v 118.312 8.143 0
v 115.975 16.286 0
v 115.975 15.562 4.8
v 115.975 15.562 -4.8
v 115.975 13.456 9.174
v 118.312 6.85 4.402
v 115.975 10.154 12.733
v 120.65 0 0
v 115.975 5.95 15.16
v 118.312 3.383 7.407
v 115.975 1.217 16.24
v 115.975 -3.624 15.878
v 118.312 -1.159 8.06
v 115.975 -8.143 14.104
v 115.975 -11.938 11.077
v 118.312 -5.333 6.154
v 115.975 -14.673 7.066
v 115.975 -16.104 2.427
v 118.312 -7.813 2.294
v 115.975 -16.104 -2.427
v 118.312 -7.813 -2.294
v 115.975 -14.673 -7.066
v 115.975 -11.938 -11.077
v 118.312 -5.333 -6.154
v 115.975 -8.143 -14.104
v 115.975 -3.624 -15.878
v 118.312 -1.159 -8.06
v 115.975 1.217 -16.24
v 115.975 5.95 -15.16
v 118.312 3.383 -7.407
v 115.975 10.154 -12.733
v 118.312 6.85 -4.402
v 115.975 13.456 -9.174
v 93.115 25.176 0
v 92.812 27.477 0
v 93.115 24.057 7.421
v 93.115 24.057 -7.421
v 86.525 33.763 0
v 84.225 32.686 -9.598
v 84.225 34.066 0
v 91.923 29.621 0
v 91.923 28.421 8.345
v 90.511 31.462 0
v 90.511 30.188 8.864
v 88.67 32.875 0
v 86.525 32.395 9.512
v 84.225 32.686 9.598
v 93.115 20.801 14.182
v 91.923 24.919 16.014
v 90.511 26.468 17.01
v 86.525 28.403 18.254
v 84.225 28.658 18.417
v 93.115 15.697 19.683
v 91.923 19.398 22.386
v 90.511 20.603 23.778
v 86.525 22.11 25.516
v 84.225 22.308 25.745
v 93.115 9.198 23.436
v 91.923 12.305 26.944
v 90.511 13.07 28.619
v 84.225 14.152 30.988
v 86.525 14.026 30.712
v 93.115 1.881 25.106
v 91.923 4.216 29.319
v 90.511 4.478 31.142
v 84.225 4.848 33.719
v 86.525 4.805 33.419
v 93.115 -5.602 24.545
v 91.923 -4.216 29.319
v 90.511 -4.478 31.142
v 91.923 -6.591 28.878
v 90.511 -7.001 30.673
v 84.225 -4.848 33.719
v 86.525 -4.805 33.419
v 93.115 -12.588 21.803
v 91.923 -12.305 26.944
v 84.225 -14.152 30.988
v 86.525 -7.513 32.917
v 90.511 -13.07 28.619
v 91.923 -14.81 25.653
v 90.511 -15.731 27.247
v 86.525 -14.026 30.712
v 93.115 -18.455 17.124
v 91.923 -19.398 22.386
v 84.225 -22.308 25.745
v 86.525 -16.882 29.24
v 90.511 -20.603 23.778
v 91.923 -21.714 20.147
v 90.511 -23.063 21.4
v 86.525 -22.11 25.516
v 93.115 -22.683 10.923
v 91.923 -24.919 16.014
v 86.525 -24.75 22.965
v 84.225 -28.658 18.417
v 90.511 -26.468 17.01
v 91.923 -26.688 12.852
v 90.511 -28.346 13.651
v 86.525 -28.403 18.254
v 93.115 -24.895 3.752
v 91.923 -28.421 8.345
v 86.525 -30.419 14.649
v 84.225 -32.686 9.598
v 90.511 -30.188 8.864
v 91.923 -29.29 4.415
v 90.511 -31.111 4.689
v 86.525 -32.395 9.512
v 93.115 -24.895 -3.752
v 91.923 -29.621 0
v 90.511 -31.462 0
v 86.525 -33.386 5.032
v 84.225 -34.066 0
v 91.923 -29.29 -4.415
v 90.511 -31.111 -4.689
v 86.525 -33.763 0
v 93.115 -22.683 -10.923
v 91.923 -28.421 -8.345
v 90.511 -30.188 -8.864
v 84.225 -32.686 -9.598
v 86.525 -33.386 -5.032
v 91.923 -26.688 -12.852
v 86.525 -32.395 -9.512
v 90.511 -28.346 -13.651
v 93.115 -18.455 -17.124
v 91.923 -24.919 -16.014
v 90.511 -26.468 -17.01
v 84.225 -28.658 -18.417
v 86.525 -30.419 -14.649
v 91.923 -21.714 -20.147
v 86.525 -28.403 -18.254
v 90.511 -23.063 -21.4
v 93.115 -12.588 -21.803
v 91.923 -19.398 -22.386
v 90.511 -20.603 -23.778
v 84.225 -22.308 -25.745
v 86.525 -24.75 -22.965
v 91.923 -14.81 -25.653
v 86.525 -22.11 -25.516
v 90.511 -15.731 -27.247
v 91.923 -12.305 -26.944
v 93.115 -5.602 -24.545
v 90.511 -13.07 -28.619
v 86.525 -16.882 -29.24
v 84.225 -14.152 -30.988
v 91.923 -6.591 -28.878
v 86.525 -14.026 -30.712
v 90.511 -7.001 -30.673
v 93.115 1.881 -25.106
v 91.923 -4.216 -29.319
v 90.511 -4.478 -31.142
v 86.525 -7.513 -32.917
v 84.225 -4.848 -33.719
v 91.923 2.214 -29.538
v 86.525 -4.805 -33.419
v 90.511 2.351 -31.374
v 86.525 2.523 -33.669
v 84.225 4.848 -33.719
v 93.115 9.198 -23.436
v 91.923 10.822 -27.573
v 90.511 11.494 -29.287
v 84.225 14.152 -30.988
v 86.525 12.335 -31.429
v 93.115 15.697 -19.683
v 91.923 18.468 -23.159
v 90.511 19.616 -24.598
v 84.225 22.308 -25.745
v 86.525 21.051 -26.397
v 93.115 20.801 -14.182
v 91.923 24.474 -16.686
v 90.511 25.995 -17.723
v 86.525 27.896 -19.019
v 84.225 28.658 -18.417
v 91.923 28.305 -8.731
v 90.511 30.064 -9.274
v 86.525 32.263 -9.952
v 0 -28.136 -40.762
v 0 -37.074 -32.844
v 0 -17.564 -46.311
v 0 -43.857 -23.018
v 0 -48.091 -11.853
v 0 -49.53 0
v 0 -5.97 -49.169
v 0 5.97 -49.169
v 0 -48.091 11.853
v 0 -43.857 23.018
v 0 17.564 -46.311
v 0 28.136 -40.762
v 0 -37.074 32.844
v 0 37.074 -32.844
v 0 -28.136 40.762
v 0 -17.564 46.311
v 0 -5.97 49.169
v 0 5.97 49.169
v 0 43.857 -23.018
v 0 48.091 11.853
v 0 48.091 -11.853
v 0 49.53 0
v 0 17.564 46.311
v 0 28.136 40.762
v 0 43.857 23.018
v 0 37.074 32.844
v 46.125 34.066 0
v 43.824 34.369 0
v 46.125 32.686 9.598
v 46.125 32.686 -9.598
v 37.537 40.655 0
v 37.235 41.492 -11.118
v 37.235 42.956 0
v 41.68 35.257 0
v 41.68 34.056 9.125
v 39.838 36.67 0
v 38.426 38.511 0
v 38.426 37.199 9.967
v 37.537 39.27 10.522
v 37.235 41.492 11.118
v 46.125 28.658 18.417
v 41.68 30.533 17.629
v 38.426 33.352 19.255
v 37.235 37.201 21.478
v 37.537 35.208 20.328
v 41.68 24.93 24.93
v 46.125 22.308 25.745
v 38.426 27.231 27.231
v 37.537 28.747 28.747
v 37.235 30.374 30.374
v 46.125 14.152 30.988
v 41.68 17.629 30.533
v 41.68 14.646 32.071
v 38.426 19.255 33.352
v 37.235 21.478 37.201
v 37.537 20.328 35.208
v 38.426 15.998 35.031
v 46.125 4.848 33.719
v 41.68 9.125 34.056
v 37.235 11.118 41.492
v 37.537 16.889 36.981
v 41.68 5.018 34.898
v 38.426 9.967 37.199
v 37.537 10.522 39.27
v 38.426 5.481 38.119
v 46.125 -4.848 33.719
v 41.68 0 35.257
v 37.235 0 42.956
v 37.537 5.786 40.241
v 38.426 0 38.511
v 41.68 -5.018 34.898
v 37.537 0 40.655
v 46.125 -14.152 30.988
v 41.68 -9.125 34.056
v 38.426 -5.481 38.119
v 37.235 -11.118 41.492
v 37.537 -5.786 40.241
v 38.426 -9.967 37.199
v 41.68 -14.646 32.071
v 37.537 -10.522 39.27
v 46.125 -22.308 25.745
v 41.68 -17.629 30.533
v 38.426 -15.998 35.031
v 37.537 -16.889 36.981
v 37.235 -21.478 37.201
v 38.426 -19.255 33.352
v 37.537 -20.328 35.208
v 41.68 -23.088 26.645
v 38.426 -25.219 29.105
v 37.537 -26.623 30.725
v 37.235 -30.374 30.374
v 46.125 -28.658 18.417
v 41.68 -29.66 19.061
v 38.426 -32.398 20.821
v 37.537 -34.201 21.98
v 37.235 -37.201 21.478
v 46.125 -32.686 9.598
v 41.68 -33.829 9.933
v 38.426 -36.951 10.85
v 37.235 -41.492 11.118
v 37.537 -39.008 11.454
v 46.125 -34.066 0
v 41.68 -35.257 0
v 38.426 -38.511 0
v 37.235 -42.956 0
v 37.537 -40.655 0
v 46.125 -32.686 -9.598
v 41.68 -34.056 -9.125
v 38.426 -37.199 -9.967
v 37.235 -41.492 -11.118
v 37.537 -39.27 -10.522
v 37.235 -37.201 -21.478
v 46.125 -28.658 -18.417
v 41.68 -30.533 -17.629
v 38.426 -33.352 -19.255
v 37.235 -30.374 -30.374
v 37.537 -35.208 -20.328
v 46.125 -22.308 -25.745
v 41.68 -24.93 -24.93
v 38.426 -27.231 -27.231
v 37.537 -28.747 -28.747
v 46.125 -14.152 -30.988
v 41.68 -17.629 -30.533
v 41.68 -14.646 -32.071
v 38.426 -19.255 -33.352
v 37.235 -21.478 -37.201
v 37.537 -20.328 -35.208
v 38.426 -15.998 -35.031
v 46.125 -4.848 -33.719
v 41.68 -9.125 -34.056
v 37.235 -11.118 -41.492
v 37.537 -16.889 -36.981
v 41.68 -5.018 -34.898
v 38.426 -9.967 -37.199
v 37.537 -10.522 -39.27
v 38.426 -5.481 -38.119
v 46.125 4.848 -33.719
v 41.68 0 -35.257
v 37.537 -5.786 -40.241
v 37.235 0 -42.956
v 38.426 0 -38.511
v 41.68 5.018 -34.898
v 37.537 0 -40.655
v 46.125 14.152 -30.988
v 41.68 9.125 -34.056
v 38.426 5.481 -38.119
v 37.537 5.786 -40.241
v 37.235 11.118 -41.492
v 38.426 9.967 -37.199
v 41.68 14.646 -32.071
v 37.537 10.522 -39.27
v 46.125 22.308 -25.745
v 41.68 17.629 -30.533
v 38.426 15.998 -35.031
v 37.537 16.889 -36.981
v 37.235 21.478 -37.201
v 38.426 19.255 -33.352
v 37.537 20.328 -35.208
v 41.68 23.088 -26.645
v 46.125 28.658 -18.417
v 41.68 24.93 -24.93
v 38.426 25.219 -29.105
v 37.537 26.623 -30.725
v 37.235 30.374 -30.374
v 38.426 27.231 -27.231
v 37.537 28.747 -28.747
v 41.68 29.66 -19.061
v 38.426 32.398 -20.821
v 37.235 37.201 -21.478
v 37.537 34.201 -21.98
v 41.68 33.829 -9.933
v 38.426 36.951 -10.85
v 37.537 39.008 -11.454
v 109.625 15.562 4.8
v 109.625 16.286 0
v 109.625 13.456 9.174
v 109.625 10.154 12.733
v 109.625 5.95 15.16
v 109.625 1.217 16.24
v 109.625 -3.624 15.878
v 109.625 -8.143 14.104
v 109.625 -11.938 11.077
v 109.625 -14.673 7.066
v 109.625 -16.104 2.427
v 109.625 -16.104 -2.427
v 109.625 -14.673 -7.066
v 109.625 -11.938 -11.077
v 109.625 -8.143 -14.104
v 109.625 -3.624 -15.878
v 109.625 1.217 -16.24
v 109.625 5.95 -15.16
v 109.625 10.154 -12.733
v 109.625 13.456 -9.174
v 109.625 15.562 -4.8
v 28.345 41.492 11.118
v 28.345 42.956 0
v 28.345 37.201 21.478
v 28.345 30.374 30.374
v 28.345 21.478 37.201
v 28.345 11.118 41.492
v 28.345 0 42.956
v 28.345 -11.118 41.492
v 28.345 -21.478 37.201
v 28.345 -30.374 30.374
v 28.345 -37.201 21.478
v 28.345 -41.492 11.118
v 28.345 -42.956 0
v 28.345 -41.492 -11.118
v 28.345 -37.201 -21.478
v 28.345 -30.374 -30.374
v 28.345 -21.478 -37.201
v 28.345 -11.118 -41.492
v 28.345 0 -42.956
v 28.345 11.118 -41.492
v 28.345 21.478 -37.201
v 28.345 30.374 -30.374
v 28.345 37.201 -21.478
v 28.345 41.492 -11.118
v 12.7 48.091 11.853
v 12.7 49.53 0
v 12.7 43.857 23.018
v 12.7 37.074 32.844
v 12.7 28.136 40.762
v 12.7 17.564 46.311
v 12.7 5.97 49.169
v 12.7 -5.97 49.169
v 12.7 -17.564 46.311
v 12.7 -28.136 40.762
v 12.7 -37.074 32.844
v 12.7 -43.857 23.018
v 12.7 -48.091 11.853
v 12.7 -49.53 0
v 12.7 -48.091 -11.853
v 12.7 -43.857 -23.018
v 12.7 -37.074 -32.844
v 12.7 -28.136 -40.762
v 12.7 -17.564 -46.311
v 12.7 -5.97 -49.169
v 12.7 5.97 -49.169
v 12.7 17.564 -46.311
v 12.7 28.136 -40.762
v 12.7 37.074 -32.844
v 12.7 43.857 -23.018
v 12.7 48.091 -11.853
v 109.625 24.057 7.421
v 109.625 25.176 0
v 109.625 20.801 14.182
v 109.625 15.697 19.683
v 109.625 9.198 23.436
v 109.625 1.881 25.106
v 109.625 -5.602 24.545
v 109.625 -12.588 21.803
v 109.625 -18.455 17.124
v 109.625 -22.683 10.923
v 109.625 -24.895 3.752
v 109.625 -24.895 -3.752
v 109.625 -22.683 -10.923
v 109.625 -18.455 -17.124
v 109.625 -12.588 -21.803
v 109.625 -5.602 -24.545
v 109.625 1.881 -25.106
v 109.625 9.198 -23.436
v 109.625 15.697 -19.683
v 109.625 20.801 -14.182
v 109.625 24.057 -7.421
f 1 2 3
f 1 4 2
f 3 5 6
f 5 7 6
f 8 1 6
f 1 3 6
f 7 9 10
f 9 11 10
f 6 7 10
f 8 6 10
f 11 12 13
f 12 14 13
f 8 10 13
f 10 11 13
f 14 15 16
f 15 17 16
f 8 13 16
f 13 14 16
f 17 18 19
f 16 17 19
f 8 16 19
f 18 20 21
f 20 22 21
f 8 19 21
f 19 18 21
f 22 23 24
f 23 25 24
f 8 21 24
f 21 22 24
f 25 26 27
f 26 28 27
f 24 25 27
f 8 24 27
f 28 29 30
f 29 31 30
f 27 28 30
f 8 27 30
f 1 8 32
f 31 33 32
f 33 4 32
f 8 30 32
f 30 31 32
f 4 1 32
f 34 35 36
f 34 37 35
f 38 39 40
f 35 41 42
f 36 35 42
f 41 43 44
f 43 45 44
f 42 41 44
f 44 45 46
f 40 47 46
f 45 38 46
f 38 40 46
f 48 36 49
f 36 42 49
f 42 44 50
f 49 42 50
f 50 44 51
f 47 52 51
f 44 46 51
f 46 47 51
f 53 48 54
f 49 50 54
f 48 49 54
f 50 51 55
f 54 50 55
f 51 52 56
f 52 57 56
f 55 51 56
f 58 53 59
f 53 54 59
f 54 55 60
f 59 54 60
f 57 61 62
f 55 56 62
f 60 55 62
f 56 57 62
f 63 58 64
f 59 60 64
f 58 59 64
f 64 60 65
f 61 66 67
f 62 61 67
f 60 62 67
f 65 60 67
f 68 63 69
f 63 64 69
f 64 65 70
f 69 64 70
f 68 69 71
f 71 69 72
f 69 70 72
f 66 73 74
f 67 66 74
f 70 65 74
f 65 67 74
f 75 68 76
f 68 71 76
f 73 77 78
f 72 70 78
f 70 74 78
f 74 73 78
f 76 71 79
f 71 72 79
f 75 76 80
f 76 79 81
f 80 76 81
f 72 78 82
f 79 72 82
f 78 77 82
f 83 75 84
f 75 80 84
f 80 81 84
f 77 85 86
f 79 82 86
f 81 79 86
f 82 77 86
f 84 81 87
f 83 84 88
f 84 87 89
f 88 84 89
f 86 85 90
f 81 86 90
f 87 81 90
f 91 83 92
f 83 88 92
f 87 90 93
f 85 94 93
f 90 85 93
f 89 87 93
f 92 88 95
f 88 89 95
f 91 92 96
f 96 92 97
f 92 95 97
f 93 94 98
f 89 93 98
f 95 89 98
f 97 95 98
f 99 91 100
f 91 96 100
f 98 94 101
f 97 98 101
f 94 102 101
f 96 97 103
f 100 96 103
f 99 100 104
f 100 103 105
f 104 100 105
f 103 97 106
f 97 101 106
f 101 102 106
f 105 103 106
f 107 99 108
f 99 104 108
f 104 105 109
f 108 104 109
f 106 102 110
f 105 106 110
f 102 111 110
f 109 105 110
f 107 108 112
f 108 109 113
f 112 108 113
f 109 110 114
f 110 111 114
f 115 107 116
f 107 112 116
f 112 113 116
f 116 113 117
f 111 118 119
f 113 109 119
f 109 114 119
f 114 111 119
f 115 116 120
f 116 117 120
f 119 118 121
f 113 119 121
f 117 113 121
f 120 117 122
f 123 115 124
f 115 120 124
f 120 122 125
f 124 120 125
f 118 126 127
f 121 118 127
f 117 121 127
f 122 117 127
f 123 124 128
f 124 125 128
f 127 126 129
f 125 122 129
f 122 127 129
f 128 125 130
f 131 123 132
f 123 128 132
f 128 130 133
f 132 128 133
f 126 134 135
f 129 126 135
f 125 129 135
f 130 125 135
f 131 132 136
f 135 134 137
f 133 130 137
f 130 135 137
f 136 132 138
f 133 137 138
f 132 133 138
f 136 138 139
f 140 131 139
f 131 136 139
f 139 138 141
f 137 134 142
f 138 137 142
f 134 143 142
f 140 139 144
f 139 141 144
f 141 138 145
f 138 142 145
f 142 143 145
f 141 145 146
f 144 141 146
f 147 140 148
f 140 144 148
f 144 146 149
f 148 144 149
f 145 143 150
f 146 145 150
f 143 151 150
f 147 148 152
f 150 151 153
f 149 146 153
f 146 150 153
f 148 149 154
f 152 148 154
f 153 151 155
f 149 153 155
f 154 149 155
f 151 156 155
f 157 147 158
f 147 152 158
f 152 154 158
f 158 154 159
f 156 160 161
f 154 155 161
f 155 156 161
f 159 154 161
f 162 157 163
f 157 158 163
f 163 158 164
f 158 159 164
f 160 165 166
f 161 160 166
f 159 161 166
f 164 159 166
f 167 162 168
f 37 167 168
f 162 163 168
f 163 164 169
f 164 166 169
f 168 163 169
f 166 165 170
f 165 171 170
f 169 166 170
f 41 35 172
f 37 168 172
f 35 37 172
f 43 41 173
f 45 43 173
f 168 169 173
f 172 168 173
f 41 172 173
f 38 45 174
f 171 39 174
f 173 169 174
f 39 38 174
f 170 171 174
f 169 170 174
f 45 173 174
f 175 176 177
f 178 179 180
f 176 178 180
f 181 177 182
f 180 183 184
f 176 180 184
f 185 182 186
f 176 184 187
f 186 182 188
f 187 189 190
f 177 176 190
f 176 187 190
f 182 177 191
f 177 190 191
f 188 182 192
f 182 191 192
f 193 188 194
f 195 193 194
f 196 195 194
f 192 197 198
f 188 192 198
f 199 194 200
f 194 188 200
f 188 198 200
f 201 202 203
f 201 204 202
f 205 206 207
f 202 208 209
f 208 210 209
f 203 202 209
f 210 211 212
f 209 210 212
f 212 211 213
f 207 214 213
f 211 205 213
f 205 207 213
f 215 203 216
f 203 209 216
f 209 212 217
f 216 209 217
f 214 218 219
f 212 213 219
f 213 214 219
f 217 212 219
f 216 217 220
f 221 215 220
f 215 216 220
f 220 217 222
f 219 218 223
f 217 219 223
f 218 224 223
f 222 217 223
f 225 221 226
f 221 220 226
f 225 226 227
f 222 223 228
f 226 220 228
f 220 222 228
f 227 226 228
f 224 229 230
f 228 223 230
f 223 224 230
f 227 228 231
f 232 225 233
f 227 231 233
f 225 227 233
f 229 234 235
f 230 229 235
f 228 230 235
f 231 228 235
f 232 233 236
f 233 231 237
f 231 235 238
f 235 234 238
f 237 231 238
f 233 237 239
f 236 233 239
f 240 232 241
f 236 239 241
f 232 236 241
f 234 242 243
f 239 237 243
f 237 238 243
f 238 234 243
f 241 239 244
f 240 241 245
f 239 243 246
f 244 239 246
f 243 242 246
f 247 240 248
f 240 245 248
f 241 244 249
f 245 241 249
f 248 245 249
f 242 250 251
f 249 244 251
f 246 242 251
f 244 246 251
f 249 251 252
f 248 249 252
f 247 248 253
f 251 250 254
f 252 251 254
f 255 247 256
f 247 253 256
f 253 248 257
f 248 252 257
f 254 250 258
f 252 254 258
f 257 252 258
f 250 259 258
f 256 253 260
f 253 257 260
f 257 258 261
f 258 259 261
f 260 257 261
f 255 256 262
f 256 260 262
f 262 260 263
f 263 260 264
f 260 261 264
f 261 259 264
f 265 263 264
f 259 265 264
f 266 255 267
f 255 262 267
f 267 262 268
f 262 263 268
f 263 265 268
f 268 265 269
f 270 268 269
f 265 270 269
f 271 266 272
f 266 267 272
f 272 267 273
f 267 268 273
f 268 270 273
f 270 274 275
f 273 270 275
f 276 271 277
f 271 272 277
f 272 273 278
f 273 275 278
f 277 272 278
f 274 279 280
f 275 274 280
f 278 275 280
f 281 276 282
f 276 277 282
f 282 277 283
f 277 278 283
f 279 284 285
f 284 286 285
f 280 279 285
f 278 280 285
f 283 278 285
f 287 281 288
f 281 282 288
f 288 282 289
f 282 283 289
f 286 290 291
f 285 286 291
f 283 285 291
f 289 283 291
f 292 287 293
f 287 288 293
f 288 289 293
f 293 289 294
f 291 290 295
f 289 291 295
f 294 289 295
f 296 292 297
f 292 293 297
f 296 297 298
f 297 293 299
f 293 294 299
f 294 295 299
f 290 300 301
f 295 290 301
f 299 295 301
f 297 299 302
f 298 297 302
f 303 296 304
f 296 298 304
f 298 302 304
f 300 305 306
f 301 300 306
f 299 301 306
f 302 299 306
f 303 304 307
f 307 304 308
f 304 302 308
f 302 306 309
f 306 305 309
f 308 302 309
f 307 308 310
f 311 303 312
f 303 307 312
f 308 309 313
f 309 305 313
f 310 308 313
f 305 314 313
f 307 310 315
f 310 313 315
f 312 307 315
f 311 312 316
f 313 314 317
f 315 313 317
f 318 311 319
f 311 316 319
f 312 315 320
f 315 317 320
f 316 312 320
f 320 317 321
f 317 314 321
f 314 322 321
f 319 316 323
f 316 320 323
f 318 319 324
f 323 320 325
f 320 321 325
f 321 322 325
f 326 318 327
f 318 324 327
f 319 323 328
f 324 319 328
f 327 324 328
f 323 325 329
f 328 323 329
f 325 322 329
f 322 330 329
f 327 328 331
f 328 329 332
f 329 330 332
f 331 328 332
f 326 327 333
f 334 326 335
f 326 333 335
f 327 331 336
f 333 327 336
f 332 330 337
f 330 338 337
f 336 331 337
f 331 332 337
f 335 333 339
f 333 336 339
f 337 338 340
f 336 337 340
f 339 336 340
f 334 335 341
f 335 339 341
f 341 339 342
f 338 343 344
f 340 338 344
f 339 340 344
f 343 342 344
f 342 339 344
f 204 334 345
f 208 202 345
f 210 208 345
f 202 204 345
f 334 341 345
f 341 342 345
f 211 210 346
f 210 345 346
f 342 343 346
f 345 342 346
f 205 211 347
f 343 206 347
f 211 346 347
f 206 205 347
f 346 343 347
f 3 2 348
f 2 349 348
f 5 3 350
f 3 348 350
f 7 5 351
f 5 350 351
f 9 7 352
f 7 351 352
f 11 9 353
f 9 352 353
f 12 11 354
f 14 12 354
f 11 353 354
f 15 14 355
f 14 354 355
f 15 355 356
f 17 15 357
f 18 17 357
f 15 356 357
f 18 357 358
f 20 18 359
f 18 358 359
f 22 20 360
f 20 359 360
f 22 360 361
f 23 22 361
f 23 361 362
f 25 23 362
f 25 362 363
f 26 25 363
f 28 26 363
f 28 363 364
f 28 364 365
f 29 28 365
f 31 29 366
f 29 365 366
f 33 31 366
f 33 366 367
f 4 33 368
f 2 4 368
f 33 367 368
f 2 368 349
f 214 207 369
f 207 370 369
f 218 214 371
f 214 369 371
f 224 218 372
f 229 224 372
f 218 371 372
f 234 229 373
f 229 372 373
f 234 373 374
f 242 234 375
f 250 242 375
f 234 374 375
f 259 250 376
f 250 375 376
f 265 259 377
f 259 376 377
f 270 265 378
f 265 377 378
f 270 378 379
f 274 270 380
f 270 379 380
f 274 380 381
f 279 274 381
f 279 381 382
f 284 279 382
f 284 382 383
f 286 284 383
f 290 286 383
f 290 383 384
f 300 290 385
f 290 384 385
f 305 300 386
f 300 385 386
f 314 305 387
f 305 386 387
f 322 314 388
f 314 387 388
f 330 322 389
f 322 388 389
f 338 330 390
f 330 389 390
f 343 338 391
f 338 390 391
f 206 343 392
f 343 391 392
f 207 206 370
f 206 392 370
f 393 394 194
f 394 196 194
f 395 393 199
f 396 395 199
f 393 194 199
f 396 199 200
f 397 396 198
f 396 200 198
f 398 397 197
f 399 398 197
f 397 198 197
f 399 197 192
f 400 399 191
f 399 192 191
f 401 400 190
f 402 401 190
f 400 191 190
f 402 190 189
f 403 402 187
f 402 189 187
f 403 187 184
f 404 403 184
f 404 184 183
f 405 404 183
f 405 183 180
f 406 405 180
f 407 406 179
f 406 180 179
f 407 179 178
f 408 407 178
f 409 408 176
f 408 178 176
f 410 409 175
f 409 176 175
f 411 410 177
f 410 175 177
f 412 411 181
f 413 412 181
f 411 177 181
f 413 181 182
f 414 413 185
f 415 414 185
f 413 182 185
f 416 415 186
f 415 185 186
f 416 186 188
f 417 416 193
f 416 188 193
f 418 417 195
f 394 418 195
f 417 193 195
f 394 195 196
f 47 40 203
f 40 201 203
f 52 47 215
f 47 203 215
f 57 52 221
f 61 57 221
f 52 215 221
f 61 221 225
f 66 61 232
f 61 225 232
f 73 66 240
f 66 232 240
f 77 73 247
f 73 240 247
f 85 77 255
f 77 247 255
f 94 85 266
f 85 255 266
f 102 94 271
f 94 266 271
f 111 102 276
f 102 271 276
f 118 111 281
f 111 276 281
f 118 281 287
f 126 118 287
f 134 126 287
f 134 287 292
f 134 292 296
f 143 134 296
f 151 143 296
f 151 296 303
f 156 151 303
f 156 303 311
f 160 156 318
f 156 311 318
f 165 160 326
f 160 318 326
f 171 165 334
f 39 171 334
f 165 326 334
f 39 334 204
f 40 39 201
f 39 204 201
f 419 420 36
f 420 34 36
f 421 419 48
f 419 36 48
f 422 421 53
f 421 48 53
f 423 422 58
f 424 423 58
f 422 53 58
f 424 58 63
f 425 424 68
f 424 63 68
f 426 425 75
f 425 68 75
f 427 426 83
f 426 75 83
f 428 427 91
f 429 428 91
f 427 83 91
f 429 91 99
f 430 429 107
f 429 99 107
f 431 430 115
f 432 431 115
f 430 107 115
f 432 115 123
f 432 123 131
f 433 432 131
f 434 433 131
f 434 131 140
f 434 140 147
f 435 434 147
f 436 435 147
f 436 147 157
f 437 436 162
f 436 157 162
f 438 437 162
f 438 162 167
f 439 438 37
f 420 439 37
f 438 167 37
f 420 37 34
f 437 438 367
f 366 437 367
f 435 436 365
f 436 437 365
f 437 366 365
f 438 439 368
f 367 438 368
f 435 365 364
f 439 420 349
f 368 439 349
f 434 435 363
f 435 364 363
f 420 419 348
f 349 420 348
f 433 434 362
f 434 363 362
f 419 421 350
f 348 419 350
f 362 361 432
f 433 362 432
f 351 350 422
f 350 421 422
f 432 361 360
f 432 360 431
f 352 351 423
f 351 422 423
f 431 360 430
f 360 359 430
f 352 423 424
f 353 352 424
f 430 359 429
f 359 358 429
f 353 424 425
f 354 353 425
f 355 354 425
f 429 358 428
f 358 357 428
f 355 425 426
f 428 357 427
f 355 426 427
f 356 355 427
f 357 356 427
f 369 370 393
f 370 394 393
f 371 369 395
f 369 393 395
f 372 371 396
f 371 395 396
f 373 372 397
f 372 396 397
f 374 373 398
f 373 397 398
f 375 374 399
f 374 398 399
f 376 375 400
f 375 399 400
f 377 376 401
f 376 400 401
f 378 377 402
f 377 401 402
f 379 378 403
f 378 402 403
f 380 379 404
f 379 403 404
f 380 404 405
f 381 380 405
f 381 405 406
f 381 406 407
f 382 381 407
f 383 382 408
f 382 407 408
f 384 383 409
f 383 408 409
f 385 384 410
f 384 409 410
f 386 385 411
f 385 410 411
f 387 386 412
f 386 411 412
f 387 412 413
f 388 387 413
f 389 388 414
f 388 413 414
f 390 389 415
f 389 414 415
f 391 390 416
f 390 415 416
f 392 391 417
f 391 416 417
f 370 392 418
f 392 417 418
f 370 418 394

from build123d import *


with BuildPart() as part:
    # Sketch1 → Revolve5 (revolve)
    with BuildSketch(Plane.XY):
        with BuildLine():
            Line((0, 0), (120.65, 0))
            Line((120.65, 0), (115.974515988, 16.285996254))
            Line((115.974515988, 16.285996254), (109.624515988, 16.285996254))
            Line((109.624515988, 16.285996254), (109.624515988, 25.175996254))
            Line((109.624515988, 25.175996254), (93.114515988, 25.175996254))
            ThreePointArc((93.114515988, 25.175996254), (90.510695272, 31.462175539), (84.224515988, 34.065996254))
            Line((84.224515988, 34.065996254), (46.124515988, 34.065996254))
            ThreePointArc((46.124515988, 34.065996254), (39.838336703, 36.66981697), (37.234515988, 42.955996254))
            Line((37.234515988, 42.955996254), (28.344515988, 42.955996254))
            Line((28.344515988, 42.955996254), (12.7, 49.53))
            Line((12.7, 49.53), (0, 49.53))
            Line((0, 49.53), (0, 0))
        make_face()
    revolve(axis=Axis((0, 0, 0), (1, 0, 0)))


solid = part.part
